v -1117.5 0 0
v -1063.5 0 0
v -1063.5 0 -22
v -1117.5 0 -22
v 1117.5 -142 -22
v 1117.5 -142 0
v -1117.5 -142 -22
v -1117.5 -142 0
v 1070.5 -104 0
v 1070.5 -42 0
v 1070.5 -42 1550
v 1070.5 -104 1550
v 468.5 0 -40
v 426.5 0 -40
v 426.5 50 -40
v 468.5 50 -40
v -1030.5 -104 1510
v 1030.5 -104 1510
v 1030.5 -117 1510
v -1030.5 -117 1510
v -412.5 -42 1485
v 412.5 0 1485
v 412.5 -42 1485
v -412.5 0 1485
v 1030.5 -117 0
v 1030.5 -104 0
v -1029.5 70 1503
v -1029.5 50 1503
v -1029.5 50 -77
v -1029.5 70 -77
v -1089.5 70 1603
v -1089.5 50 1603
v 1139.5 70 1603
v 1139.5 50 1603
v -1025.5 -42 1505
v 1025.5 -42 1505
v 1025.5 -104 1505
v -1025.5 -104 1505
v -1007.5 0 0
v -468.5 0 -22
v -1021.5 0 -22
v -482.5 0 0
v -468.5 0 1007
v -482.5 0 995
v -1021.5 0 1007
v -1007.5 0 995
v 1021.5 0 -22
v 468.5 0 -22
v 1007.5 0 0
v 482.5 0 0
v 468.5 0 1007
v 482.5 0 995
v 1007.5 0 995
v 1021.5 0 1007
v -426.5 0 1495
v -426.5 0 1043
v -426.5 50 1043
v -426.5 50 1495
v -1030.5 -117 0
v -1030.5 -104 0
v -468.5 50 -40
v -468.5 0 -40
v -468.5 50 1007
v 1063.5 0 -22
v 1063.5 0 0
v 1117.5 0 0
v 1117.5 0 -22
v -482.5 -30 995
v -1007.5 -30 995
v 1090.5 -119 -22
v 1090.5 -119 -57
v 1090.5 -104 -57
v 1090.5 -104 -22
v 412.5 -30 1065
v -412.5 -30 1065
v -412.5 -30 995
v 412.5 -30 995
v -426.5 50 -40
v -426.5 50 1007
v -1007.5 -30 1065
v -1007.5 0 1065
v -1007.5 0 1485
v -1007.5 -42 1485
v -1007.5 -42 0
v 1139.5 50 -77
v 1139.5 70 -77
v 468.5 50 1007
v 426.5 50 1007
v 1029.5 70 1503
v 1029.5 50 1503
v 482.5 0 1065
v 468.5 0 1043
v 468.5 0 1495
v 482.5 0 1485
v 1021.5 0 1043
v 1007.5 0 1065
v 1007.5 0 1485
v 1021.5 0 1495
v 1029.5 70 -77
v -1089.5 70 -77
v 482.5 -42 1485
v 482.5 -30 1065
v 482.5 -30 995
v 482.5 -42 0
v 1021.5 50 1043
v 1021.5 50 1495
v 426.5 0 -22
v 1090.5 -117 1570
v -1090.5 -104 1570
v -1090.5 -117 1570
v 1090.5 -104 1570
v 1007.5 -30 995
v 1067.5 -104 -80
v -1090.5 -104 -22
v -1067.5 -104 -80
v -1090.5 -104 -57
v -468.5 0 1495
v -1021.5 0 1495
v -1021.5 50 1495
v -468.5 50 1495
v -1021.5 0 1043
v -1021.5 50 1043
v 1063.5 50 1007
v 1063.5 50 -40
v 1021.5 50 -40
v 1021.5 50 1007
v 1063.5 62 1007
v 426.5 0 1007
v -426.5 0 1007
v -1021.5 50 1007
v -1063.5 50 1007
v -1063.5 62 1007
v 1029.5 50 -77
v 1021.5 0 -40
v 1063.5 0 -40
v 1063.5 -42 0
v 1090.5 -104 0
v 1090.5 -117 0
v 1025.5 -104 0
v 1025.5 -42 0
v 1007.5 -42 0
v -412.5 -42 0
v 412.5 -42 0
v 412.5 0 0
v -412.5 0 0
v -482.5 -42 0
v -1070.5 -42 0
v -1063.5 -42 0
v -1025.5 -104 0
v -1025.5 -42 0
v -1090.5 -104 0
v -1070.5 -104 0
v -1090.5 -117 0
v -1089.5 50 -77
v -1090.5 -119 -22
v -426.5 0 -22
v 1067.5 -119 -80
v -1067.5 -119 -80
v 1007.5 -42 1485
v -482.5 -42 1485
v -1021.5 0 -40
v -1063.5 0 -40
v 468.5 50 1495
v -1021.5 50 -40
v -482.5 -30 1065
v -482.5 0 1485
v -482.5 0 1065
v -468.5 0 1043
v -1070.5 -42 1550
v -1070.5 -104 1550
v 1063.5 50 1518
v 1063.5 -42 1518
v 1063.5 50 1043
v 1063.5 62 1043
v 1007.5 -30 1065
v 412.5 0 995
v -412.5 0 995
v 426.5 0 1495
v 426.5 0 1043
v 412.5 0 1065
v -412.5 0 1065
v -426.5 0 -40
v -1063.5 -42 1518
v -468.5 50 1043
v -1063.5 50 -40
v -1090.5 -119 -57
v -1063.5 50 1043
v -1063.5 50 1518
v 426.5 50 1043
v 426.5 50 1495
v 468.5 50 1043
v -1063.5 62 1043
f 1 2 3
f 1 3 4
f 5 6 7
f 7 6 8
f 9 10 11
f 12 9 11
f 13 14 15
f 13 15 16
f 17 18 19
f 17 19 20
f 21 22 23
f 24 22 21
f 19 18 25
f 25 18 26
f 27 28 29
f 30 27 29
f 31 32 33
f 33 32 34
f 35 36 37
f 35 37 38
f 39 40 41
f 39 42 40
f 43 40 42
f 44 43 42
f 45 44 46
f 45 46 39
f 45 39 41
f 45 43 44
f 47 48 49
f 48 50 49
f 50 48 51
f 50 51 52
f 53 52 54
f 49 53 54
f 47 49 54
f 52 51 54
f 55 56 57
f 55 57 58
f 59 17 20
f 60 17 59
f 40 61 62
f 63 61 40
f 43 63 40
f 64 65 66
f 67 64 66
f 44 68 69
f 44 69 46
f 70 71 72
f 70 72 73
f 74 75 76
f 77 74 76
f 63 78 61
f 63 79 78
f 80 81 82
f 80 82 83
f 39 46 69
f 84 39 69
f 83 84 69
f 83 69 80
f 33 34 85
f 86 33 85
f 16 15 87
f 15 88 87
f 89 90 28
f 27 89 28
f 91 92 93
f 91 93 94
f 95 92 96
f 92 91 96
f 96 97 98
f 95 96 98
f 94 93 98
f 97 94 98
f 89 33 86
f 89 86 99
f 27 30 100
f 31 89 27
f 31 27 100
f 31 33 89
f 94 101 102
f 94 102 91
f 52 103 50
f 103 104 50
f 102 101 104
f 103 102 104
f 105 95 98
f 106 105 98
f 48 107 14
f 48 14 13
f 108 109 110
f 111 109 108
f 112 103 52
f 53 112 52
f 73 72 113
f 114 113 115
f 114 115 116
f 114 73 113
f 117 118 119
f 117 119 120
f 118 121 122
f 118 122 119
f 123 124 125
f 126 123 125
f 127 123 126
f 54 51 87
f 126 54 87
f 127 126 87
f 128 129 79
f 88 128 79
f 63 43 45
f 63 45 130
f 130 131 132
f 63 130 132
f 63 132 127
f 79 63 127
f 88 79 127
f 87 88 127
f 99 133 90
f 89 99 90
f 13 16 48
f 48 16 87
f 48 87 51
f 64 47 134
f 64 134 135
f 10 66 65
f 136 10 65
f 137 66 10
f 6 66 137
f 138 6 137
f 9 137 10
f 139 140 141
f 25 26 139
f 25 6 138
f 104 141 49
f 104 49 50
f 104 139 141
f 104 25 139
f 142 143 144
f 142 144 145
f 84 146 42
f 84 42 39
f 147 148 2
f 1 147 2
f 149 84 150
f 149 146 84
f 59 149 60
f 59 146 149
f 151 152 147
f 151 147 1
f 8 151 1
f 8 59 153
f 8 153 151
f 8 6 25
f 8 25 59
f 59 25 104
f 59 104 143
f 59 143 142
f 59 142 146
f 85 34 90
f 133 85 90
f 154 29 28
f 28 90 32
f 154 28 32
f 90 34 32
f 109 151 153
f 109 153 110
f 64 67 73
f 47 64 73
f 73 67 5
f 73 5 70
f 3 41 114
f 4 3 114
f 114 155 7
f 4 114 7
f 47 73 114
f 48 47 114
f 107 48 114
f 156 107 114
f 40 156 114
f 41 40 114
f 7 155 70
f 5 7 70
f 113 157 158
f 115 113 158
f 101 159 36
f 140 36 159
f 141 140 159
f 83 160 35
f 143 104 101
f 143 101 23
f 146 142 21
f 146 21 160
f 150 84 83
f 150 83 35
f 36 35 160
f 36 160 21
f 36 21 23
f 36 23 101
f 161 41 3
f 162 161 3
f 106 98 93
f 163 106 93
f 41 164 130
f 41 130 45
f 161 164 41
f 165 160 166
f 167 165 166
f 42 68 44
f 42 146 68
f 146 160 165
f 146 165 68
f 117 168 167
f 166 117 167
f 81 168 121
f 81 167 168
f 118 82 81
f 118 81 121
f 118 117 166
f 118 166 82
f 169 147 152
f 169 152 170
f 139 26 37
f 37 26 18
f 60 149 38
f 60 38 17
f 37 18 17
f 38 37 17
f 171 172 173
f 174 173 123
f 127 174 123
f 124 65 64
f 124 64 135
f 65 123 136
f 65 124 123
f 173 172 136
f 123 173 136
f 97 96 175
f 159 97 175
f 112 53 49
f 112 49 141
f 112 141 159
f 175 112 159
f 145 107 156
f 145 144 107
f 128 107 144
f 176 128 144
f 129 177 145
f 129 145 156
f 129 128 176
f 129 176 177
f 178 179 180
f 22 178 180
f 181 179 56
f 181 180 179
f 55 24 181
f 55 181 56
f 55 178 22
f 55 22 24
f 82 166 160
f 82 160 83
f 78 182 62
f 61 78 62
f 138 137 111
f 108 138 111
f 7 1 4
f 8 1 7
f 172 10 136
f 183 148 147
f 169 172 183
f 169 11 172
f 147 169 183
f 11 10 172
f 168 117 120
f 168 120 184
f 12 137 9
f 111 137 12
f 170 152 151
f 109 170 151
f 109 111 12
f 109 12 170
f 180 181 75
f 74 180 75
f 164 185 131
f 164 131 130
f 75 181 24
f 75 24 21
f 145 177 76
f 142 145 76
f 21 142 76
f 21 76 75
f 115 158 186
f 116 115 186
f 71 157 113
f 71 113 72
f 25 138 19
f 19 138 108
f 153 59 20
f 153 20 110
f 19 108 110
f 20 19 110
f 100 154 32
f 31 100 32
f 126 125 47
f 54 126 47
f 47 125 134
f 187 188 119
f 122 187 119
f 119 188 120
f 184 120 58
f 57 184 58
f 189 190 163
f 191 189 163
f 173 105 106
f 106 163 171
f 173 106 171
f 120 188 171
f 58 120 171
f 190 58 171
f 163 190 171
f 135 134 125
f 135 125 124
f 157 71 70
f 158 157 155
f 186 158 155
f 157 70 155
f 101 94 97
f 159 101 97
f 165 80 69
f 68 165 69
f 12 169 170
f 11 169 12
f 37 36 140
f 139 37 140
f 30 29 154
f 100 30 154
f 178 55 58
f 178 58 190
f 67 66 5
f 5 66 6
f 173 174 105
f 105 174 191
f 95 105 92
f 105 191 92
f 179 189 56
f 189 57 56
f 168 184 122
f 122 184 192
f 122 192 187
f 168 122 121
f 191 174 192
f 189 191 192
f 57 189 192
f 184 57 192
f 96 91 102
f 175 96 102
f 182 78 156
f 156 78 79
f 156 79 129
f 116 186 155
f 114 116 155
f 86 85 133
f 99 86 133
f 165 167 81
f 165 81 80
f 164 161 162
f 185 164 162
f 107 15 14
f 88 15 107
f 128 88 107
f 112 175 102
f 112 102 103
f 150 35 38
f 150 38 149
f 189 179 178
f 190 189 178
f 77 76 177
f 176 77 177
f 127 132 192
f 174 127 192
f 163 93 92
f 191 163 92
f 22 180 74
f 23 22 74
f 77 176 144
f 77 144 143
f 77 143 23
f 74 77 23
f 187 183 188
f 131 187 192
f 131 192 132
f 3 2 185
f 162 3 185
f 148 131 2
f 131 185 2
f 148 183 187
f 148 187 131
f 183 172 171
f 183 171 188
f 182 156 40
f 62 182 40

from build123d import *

# Parameters (mm, degrees)
F1_DEPTH  = 1485
F2_W      = 1063.5
F2_H      = 42
F3_DEPTH  = 33
F4_W      = 1117.5
F4_H      = 142
F5_DEPTH  = 22
F7_DEPTH  = 1063.5
F9_DEPTH  = 62
F11_DEPTH = 13
F14_DEPTH = 15
F16_DEPTH = 50
F17_W     = 42
F17_H     = 50
F18_DEPTH = 40
F21_DEPTH = 20


with BuildPart() as f1:
    # F0 (on Top) → F1 (new body)
    with BuildSketch(Plane.XY):
        Polygon((426.5, 50), (426.5, 0), (412.5, 0), (412.5, -42), (482.5, -42), (482.5, 0), (468.5, 0), (468.5, 50), align=None)
    extrude(amount=F1_DEPTH)



with BuildPart() as f1b:
    # F0 (on Top) → F1, piece 2 (new body)
    with BuildSketch(Plane.XY):
        Polygon((1021.5, 0), (1007.5, 0), (1007.5, -42), (1063.5, -42), (1063.5, 50), (1021.5, 50), align=None)
    extrude(amount=F1_DEPTH)


with BuildPart() as f1_1:
    add(f1.part)

    add(f1b.part)  # F3 merges F1b
    # F2 (on face) → F3 (join)
    with BuildSketch(Plane.XY.offset(1485)):
        with Locations((531.75, -21)):
            Rectangle(F2_W, F2_H)
    extrude(amount=F3_DEPTH)

    # F4 (on face) → F5 (join)
    with BuildSketch(Plane(origin=(0, 0, 0), x_dir=(1, 0, 0), z_dir=(0, 0, -1))):
        with Locations((558.75, 71)):
            Rectangle(F4_W, F4_H)
    extrude(amount=F5_DEPTH)

    # F6 (on face) → F7 (join, through all)
    with BuildSketch(Plane.YZ.offset(1063.5)):
        Polygon((0, 1065), (-30, 1065), (-30, 995), (0, 995), (0, 1007), (62, 1007), (62, 1043), (0, 1043), align=None)
    extrude(amount=-F7_DEPTH)

    # F8 (on face) → F9 (join)
    with BuildSketch(Plane.XZ.offset(42)):
        Polygon((1025.5, 1505), (1025.5, 0), (1070.5, 0), (1070.5, 1550), (0, 1550), (0, 1505), align=None)
    extrude(amount=F9_DEPTH)

    # F10 (on face) → F11 (join)
    with BuildSketch(Plane.XZ.offset(104)):
        Polygon((1030.5, 1510), (1030.5, 0), (1090.5, 0), (1090.5, 1570), (0, 1570), (0, 1510), align=None)
    extrude(amount=F11_DEPTH)

    # F13 (on offset) → F14 (join)
    with BuildSketch(Plane.XZ.offset(119)):
        Polygon((1090.5, -57), (1090.5, -22), (0, -22), (0, -80), (1067.5, -80), align=None)
    extrude(amount=-F14_DEPTH)

    # F15 (on face) → F16 (join, through all)
    with BuildSketch(Plane(origin=(0, 0, 0), x_dir=(-1, 0, 0), z_dir=(0, 1, 0))):
        Polygon((-1063.5, 1518), (-1063.5, 1485), (-1021.5, 1485), (-1021.5, 1495), (-468.5, 1495), (-468.5, 1485), (-426.5, 1485), (-426.5, 1495), (0, 1495), (0, 1518), align=None)
    extrude(amount=F16_DEPTH)

    # F17 (on face) → F18 (join)
    with BuildSketch(Plane(origin=(0, 0, 0), x_dir=(1, 0, 0), z_dir=(0, 0, -1))):
        with Locations((447.5, -25)):
            Rectangle(F17_W, F17_H)
        with Locations((1042.5, -25)):
            Rectangle(F17_W, F17_H)
    extrude(amount=F18_DEPTH)

    # F19: F1 across plane


with BuildPart() as f1_2:
    add(f1_1.part)
    add(f1_1.part.mirror(Plane.YZ))


with BuildPart() as f21:
    # F20 (on face) → F21 (new body)
    with BuildSketch(Plane(origin=(0, 50, 0), x_dir=(-1, 0, 0), z_dir=(0, 1, 0))):
        Polygon((-1029.5, -77), (-1029.5, 1503), (1029.5, 1503), (1029.5, -77), (1089.5, -77), (1089.5, 1603), (-1139.5, 1603), (-1139.5, -77), align=None)
    extrude(amount=F21_DEPTH)


solid = Compound([f1_2.part, f21.part])
